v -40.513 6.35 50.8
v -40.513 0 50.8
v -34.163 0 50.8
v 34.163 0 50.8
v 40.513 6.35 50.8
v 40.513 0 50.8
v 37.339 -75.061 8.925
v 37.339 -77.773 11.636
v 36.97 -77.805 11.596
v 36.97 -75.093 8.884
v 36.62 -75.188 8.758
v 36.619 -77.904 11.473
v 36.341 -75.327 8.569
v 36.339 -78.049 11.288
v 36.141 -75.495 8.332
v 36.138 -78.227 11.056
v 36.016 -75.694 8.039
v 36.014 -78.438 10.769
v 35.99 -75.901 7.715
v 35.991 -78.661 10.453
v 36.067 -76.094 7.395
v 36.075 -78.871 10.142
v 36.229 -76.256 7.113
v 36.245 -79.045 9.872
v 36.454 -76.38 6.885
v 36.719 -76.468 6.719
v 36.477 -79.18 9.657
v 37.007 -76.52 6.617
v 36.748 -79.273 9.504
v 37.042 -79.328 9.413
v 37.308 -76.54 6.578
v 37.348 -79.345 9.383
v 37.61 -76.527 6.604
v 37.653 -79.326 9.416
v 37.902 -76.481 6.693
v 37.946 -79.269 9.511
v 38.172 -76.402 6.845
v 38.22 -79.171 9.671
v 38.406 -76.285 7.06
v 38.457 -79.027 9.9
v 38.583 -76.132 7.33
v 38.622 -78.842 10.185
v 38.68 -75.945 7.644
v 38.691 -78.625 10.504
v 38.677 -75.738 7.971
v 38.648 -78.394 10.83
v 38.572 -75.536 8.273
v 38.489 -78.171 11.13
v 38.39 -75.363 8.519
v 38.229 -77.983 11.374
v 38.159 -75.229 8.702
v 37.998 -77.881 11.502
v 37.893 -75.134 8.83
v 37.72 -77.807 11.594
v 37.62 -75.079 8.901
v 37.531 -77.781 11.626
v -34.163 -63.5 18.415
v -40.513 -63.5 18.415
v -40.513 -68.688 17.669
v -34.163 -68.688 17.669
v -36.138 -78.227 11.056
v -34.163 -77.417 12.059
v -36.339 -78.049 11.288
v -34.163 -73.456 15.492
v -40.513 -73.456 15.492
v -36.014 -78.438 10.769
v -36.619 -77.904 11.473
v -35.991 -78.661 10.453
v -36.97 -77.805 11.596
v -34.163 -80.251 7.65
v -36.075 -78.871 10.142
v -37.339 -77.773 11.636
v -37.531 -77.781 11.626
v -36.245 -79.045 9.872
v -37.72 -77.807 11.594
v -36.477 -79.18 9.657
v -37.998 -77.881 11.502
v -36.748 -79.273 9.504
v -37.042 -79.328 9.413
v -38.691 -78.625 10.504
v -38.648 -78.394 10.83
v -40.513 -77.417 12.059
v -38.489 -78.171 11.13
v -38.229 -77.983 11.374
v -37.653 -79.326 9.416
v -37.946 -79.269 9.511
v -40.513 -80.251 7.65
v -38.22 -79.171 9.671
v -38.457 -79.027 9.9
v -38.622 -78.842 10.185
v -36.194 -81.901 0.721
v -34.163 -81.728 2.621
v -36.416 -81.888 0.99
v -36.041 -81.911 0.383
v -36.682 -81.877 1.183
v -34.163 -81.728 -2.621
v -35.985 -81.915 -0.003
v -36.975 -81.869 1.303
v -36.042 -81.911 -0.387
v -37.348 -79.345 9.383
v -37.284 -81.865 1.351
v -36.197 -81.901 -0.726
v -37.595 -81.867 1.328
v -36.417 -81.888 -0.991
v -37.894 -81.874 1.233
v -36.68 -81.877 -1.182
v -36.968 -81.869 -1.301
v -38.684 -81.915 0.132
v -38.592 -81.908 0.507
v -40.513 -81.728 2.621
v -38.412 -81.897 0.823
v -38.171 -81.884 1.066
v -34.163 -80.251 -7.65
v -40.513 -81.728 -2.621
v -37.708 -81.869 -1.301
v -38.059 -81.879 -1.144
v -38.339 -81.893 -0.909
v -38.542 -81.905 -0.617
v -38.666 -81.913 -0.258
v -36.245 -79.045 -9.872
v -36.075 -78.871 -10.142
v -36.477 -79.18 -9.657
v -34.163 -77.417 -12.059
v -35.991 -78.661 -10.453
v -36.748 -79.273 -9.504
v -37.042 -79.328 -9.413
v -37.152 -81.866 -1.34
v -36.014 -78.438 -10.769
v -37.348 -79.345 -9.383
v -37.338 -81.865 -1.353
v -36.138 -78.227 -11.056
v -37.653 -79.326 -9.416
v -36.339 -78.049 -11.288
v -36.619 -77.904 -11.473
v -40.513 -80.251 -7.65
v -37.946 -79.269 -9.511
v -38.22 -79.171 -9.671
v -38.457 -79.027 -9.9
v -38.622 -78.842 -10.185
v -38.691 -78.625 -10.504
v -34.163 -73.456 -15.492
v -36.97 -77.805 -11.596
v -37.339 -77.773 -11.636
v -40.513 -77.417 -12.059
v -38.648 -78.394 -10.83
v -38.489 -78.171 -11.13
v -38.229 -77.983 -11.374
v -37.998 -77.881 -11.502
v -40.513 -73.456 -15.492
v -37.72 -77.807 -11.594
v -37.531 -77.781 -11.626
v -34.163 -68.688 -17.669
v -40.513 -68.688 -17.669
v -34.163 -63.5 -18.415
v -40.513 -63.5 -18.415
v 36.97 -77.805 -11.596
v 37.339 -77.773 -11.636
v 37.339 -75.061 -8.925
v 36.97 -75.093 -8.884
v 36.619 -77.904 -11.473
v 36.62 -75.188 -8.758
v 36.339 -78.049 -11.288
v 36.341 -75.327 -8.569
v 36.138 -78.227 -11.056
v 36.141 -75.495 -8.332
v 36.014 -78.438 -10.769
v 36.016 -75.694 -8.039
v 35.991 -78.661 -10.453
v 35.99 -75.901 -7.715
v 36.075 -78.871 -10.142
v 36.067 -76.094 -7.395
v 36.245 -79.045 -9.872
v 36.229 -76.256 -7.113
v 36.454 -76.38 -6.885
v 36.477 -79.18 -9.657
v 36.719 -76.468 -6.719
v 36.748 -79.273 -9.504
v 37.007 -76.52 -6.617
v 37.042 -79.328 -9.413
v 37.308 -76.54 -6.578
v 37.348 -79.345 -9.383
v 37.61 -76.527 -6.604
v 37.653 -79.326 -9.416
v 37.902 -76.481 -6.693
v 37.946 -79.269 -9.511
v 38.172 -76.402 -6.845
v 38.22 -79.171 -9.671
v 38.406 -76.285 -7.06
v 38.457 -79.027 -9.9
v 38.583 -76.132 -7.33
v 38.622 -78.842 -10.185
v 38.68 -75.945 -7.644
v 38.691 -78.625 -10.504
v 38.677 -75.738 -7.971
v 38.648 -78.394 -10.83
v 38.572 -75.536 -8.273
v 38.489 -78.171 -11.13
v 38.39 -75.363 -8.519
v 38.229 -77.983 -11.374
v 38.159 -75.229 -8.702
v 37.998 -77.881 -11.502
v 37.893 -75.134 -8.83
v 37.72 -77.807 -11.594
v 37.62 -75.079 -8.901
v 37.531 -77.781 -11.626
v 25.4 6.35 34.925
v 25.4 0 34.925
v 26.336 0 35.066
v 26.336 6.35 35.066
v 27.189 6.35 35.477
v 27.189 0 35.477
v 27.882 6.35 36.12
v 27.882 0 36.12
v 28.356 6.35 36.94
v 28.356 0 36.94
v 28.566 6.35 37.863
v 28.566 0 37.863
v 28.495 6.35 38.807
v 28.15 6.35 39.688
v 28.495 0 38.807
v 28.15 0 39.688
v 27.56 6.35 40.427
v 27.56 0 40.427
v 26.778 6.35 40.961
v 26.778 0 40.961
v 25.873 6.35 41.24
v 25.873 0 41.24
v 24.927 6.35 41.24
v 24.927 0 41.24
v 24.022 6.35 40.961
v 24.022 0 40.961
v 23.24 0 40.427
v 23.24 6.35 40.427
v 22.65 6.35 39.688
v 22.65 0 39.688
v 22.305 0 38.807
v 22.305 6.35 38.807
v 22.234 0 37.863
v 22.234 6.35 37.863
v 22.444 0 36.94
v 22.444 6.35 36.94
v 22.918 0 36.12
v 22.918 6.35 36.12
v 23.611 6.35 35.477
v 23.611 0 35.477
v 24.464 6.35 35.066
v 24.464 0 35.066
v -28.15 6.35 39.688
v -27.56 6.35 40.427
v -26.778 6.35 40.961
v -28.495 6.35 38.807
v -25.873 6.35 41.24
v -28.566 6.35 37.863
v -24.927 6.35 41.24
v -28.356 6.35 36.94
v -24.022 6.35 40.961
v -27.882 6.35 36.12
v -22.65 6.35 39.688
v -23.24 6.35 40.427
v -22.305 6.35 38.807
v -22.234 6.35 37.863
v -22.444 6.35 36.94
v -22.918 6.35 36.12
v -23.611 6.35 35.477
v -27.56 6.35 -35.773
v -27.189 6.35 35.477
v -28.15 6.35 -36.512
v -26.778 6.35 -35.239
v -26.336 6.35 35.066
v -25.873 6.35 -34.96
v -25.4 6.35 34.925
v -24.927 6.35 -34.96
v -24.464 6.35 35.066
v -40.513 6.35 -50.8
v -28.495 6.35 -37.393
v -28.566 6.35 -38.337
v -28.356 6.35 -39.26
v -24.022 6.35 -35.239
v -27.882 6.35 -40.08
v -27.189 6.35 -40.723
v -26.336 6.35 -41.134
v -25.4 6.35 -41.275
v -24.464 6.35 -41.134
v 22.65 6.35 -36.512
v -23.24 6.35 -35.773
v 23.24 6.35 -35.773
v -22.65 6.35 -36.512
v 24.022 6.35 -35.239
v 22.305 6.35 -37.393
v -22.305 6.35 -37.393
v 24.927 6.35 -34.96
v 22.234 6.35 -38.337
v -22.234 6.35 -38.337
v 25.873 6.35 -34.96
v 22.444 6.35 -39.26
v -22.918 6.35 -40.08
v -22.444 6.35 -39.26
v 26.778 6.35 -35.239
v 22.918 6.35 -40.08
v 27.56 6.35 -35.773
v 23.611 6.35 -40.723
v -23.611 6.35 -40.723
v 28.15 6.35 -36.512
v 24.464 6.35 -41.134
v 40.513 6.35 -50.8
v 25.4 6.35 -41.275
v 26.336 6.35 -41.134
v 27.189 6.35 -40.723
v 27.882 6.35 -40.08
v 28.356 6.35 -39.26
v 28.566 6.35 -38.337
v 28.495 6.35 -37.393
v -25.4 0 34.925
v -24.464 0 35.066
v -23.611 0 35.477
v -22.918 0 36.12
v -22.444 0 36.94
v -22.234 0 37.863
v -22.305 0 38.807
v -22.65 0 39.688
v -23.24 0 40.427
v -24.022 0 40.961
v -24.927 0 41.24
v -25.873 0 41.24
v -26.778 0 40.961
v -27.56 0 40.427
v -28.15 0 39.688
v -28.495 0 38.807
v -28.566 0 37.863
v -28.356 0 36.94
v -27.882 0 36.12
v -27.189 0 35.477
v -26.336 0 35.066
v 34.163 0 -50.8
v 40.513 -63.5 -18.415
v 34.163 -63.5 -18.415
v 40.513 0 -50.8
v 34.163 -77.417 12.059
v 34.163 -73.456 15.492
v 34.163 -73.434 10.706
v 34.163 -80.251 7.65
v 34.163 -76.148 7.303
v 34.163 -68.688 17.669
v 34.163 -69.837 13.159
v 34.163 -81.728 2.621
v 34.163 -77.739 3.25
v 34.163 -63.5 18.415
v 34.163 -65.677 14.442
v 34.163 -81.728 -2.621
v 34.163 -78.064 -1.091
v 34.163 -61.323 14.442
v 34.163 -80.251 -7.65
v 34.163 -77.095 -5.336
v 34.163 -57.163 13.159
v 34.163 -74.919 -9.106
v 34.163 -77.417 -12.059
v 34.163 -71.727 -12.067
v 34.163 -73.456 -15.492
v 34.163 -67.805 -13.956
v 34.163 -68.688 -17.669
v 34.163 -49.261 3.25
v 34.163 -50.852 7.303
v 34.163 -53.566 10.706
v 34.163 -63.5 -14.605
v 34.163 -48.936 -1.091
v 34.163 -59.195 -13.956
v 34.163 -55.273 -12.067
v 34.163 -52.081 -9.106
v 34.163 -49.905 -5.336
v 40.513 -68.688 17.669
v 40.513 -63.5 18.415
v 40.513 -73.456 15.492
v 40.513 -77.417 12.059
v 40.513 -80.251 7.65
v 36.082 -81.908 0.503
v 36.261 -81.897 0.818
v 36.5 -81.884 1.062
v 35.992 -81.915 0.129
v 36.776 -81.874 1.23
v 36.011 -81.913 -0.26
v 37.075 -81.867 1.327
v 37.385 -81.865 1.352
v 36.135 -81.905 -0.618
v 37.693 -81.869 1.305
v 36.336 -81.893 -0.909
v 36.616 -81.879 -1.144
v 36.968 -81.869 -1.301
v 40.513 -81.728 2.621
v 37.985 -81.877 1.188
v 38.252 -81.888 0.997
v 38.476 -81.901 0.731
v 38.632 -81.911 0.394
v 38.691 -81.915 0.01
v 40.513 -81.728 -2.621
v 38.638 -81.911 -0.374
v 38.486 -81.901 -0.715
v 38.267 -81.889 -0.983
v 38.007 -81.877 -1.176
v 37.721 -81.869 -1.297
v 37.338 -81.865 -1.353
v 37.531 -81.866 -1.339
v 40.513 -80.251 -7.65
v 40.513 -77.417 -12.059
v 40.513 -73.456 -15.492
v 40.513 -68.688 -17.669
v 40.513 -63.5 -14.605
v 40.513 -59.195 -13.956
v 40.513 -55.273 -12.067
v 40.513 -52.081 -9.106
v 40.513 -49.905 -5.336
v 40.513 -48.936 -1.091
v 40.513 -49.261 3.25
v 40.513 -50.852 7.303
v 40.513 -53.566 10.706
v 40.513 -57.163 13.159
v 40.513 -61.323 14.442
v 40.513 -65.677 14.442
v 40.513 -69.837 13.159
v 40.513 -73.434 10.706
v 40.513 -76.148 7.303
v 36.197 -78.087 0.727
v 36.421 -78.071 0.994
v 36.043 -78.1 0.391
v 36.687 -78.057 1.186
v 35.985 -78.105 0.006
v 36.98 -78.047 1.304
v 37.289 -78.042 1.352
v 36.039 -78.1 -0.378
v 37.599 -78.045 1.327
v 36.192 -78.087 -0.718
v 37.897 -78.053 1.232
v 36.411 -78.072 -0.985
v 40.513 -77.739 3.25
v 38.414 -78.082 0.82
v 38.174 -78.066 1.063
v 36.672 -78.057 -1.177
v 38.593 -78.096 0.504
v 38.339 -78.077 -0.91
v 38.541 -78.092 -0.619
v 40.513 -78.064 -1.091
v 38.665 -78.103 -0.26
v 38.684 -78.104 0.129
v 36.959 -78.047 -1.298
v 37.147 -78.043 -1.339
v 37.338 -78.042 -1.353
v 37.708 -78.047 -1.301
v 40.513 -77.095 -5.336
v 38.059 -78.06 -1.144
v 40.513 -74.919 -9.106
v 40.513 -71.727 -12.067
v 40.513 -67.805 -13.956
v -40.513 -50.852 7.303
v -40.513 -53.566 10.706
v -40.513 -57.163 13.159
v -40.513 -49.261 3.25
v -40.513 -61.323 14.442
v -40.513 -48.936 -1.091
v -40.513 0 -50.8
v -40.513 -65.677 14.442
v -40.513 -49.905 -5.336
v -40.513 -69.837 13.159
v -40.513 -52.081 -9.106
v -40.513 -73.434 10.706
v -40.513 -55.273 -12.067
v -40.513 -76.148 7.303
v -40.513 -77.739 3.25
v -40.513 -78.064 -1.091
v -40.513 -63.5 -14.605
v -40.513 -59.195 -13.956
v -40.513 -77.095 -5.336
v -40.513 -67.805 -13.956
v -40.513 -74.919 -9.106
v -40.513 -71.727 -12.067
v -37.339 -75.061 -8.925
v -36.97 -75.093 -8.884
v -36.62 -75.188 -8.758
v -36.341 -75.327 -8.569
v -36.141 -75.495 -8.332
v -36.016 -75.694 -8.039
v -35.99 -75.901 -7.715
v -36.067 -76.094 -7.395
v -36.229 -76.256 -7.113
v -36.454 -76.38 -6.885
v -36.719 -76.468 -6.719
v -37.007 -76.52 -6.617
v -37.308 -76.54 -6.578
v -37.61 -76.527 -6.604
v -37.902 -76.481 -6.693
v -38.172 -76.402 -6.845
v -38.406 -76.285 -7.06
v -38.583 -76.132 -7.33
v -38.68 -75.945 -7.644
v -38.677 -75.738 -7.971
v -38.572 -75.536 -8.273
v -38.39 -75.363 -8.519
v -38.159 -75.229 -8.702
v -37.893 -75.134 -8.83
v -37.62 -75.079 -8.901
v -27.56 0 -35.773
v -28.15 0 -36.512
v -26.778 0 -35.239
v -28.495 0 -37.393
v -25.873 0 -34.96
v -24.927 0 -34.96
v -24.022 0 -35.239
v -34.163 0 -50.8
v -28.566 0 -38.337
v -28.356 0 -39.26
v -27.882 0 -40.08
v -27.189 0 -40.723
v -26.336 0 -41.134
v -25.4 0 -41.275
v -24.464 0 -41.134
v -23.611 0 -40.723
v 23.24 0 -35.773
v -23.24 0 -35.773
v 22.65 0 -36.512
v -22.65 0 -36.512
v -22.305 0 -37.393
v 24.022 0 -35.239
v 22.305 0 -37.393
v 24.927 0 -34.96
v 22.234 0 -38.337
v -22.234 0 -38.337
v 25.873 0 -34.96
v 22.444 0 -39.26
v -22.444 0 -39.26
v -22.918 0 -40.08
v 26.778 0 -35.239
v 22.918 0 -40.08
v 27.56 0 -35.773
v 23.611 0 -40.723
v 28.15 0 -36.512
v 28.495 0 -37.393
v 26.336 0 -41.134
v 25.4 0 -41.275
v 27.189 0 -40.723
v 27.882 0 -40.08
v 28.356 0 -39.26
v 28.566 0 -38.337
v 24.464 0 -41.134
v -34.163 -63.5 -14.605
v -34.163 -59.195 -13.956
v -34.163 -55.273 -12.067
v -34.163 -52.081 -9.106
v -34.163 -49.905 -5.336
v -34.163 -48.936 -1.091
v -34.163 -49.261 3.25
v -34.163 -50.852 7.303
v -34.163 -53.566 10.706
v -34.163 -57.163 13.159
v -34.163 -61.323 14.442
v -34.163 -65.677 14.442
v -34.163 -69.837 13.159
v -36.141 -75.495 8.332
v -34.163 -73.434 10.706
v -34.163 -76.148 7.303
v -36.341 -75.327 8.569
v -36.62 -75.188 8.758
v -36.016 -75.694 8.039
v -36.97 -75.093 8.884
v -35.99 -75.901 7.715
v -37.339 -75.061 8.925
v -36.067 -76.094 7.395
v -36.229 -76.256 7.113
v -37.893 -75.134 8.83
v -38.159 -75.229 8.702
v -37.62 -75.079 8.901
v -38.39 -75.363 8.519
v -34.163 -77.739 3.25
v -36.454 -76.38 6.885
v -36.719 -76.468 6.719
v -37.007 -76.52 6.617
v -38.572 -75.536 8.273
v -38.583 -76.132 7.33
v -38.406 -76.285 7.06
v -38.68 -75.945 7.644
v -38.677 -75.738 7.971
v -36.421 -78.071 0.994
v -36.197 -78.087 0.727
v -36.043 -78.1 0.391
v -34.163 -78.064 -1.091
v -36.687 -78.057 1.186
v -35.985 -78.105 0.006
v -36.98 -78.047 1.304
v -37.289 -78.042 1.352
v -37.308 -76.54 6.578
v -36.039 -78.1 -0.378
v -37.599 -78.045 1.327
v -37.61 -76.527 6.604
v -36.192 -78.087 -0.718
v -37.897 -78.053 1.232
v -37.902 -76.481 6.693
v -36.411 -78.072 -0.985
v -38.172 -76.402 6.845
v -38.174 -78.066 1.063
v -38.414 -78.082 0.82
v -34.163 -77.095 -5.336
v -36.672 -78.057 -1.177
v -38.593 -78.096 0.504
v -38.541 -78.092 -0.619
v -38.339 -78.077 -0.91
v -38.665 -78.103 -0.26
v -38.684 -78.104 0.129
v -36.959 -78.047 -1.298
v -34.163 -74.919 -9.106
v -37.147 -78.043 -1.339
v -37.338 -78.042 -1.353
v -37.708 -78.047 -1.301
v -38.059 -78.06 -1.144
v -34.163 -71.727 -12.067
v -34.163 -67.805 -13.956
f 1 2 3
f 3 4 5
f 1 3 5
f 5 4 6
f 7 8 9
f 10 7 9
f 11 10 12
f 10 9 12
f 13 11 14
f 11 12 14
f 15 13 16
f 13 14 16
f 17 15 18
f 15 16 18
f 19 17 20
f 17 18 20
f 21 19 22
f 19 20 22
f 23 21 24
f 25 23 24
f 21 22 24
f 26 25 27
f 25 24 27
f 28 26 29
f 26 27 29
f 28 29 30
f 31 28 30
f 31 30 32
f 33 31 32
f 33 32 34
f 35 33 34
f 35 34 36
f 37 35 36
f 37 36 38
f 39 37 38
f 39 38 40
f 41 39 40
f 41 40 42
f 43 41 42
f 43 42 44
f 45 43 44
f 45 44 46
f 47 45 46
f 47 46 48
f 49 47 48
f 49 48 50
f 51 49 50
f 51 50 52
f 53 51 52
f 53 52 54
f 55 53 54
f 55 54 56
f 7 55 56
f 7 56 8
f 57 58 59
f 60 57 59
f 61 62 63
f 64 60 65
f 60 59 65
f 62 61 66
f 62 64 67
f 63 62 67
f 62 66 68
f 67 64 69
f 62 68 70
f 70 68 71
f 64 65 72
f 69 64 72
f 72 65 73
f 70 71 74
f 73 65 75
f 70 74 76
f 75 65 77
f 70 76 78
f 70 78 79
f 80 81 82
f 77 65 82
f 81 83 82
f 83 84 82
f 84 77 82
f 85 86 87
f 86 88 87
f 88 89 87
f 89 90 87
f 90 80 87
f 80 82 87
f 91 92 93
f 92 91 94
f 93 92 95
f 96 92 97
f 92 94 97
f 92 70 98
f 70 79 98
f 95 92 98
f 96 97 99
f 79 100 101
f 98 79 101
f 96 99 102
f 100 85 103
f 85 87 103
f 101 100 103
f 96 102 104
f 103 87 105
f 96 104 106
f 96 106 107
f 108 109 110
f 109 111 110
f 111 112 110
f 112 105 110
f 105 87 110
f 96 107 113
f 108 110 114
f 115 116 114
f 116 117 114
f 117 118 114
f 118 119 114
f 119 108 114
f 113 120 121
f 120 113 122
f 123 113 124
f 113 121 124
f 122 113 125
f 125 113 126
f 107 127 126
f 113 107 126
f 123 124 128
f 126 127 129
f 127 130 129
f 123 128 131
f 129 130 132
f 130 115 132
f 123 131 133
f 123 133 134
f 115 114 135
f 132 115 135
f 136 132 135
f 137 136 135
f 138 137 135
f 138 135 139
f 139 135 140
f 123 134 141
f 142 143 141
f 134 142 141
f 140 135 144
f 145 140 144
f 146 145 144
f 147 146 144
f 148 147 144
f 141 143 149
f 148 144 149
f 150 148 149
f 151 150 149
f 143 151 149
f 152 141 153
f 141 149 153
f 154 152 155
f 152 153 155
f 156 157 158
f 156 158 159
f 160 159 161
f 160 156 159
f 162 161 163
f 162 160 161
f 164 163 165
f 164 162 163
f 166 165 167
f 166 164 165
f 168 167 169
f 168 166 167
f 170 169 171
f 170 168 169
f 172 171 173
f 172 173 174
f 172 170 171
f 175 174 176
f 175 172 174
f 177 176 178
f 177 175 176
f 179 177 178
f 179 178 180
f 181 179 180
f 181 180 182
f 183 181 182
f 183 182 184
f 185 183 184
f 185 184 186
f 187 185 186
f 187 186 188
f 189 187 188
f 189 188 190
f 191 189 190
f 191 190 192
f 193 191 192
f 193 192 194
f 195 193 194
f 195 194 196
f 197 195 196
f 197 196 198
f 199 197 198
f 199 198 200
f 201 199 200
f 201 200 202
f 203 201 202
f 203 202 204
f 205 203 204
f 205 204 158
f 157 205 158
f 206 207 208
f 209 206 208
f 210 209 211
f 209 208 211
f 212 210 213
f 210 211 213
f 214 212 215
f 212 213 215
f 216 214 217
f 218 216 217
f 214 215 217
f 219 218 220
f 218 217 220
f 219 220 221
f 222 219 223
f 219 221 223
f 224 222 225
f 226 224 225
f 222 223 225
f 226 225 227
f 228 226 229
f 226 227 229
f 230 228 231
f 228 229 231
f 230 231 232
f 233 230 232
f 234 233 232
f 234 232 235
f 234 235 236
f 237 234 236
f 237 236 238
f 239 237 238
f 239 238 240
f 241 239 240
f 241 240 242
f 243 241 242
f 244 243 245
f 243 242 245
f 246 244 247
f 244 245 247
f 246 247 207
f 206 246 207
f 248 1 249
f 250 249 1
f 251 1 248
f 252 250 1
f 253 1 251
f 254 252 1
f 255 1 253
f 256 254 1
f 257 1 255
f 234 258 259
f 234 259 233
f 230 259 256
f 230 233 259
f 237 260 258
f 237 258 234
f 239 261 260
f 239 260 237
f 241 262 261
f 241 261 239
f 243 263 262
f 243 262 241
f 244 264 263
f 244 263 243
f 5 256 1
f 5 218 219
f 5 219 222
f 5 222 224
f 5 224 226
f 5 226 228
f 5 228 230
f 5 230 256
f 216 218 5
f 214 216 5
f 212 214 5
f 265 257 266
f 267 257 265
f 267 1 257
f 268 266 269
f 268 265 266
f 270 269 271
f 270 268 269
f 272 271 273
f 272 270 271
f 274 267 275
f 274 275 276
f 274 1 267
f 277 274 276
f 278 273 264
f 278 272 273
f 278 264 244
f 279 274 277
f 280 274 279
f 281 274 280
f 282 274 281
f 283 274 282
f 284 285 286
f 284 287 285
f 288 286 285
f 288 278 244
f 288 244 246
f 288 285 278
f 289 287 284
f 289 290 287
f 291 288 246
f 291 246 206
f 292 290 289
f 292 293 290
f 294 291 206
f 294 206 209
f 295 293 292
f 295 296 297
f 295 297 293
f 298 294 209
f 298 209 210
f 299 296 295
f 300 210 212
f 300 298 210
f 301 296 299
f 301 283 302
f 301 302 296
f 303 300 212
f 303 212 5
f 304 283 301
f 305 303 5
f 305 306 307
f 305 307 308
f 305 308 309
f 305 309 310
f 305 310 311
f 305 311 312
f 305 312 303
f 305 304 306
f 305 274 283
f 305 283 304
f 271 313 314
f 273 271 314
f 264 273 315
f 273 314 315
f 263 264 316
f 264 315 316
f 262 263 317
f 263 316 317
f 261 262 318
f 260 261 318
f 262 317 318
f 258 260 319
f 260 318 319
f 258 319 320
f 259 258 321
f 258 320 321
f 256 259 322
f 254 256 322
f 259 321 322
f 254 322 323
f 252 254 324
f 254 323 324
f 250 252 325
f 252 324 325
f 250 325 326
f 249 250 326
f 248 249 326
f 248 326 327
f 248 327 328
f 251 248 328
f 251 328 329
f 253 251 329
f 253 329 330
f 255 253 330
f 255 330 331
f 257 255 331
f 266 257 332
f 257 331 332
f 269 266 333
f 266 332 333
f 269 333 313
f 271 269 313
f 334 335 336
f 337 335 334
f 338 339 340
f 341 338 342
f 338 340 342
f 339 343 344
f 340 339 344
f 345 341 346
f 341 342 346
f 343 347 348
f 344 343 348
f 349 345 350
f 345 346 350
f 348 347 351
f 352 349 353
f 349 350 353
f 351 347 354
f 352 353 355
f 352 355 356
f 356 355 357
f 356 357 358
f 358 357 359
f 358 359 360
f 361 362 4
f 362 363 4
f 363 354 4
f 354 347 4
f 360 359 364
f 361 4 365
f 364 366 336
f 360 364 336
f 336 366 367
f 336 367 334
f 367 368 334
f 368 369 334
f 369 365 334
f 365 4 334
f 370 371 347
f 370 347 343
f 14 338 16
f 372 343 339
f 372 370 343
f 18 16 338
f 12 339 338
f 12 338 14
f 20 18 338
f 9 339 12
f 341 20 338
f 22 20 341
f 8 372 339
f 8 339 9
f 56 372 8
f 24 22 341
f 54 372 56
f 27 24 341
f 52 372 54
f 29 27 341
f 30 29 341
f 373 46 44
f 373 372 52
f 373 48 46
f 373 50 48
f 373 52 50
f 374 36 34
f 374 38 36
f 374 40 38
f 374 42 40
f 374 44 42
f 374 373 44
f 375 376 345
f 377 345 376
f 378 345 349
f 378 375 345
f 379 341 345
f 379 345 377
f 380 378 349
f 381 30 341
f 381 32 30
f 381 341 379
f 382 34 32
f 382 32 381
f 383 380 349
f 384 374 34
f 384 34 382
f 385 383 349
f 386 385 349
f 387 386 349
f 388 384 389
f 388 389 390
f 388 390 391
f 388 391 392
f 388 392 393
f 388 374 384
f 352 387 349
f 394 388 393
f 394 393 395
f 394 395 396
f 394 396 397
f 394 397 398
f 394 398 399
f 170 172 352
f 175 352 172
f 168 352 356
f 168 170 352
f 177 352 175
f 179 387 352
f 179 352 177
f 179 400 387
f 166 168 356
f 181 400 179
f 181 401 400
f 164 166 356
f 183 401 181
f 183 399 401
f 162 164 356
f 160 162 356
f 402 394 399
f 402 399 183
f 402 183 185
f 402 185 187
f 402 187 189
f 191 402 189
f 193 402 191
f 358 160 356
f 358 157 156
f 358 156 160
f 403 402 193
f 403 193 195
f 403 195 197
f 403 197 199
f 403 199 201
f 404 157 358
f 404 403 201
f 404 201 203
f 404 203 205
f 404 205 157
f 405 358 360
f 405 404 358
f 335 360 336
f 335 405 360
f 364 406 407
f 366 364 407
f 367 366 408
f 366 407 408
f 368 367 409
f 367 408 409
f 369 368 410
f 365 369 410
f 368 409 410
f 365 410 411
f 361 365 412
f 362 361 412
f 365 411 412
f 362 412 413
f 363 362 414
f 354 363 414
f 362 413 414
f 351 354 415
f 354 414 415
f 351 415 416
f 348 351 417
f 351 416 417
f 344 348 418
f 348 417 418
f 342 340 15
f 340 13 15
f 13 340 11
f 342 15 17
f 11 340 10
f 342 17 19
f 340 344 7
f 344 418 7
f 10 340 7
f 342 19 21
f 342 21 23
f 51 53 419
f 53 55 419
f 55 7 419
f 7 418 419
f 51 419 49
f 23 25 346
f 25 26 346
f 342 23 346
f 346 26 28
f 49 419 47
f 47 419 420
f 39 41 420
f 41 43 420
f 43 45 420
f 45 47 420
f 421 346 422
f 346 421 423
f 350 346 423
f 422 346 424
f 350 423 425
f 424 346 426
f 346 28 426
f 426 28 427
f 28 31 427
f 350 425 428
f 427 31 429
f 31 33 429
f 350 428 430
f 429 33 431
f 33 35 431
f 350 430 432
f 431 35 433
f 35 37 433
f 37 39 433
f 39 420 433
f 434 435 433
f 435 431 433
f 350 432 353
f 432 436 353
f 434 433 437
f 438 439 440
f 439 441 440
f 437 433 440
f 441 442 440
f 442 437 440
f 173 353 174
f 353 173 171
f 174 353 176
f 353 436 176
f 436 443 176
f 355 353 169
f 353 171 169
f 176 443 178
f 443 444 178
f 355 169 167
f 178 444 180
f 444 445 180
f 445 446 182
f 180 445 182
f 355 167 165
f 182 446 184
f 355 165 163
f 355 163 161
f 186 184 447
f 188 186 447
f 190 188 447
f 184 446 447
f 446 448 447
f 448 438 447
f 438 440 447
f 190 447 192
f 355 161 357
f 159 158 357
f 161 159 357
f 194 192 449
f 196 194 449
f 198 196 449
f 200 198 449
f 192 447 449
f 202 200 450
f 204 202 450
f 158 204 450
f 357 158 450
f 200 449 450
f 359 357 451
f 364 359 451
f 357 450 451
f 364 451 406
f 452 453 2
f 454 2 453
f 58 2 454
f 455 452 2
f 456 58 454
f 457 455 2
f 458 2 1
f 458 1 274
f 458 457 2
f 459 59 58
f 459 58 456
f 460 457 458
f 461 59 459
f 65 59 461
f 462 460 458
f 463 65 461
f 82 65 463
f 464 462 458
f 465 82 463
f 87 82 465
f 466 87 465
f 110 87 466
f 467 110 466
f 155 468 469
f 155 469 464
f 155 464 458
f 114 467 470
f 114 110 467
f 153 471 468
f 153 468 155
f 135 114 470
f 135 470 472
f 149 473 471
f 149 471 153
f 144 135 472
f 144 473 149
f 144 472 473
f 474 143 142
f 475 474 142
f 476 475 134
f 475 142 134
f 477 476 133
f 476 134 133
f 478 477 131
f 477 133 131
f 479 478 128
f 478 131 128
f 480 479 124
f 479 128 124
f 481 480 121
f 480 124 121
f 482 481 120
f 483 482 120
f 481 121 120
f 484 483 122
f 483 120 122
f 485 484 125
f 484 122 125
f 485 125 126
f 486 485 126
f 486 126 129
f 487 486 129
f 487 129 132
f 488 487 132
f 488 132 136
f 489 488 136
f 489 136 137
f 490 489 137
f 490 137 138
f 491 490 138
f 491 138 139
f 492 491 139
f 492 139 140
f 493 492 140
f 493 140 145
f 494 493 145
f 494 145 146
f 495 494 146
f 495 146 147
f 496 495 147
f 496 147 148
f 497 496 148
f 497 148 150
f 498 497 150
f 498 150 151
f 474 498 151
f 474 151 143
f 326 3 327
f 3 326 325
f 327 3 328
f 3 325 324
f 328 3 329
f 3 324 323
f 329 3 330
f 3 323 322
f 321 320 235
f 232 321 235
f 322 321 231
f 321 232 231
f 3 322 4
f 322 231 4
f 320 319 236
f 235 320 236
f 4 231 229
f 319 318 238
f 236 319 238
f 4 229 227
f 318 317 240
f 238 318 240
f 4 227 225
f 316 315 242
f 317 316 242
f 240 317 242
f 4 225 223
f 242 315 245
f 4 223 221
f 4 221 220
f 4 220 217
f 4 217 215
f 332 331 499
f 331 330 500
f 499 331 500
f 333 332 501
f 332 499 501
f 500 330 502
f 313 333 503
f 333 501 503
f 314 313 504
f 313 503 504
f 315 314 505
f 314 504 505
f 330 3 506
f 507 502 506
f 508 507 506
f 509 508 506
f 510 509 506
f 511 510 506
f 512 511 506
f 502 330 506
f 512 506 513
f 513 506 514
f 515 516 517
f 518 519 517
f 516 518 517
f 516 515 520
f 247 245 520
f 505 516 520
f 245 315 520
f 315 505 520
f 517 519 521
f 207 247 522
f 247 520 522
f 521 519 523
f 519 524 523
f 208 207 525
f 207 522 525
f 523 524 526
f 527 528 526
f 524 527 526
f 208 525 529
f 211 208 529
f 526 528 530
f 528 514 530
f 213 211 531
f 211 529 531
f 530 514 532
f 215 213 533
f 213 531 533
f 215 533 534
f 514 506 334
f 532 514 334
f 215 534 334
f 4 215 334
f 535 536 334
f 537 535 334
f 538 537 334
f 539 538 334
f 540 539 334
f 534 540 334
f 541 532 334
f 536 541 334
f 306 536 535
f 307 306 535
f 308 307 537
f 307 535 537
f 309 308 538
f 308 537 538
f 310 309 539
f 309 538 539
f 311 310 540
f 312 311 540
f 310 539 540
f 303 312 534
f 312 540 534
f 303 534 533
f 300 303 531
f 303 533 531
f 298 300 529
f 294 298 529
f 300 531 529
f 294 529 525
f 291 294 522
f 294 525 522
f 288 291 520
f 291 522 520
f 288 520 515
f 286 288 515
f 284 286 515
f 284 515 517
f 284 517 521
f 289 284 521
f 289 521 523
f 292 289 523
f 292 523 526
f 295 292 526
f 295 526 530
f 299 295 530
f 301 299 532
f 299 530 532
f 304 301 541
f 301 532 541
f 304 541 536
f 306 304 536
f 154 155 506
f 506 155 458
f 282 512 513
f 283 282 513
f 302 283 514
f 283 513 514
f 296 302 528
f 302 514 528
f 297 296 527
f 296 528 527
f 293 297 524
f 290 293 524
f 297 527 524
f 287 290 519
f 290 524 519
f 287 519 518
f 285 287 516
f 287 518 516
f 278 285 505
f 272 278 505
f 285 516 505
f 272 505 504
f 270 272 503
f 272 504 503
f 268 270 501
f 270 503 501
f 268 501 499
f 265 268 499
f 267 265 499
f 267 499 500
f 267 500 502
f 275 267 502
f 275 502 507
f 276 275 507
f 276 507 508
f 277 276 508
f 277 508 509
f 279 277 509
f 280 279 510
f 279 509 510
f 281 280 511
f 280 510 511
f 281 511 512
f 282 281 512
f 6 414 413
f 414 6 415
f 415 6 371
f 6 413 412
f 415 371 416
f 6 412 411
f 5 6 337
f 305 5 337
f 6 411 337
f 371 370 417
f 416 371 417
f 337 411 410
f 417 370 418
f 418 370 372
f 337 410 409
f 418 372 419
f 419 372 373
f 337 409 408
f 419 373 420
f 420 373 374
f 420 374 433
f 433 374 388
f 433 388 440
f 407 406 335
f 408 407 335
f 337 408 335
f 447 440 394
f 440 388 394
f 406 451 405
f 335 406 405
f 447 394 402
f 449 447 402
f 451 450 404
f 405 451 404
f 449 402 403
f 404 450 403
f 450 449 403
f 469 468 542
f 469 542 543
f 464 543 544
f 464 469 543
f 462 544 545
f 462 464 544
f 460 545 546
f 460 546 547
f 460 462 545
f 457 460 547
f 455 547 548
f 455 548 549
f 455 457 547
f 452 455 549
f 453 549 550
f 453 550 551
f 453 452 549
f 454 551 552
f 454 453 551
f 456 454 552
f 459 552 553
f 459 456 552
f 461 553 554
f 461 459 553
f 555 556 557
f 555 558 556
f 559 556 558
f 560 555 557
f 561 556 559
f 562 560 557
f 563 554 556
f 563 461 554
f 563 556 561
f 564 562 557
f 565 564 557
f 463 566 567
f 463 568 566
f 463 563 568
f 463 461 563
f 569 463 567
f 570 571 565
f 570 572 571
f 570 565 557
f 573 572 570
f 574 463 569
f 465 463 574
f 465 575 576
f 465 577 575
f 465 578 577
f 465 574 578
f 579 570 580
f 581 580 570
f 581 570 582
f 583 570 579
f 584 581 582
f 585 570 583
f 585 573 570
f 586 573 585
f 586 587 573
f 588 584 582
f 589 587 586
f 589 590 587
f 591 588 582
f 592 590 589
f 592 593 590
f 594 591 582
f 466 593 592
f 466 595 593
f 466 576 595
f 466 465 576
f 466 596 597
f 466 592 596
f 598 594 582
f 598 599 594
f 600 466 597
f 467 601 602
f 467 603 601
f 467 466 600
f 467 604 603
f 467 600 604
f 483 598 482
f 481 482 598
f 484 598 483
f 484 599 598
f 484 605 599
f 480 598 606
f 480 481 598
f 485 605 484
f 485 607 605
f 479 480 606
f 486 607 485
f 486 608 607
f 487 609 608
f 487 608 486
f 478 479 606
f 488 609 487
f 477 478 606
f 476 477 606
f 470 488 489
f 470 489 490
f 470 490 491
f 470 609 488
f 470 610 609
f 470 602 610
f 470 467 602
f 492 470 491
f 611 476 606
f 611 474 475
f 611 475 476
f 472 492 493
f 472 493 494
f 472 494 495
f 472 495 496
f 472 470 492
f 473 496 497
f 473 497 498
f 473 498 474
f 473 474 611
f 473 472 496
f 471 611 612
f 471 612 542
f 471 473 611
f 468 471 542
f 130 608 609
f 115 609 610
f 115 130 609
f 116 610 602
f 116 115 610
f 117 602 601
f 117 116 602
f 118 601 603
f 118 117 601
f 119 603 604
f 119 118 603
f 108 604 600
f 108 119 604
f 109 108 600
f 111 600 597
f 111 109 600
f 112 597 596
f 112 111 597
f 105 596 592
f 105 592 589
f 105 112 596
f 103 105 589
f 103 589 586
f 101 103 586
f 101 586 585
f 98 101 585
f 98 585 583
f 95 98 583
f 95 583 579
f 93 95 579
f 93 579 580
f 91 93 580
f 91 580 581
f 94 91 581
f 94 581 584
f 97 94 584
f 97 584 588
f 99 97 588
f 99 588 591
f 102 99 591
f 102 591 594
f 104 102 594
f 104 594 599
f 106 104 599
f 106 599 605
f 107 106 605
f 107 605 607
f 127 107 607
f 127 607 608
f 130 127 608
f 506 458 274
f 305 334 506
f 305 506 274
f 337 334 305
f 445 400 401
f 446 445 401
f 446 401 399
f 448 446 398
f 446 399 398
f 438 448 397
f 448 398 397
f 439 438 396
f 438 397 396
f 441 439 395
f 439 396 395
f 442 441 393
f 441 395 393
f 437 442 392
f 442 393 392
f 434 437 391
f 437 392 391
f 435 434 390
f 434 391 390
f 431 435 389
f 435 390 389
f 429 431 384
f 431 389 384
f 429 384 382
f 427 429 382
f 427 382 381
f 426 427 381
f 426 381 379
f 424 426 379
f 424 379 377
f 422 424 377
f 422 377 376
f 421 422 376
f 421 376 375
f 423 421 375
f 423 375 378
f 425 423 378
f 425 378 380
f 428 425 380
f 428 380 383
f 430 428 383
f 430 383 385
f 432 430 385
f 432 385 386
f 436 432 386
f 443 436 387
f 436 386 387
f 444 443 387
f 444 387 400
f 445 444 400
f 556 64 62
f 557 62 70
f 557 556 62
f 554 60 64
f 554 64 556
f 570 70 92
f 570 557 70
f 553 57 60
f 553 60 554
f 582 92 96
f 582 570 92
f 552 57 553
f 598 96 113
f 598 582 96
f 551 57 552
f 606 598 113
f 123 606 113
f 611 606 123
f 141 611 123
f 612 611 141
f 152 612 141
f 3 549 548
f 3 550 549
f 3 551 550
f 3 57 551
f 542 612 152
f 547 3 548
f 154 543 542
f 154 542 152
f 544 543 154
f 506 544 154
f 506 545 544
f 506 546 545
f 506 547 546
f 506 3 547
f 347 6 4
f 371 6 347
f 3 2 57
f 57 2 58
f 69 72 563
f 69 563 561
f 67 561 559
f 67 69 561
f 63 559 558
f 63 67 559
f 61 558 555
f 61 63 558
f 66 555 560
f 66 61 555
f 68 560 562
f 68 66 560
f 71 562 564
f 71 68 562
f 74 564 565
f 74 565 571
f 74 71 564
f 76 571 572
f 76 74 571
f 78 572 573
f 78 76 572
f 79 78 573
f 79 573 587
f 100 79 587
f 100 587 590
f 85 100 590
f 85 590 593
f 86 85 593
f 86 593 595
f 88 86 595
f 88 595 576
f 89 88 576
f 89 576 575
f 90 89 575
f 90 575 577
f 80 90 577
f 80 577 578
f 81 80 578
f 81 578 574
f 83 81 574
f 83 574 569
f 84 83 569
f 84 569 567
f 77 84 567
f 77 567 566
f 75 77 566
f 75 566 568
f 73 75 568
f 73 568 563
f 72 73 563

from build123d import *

# Parameters (mm, degrees)
SKETCH2_W               = 81.026
SKETCH2_H               = 101.6
BOSS_EXTRUDE1_DEPTH     = 6.35
SKETCH3_R               = 14.605
BOSS_EXTRUDE2_DEPTH     = 6.35
SKETCH5_R               = 1.35255
CUT_EXTRUDE1_DEPTH      = 16.256
SKETCH6_R               = 1.35255
CUT_EXTRUDE2_DEPTH      = 9.652
MIRROR2_COPY_1_SKETCH_R = 1.35255
MIRROR2_COPY_1_DEPTH    = 9.652
SKETCH7_R               = 3.175
CUT_EXTRUDE3_DEPTH      = 6.35


with BuildPart() as part:
    # Sketch2 → Boss-Extrude1 (new body)
    with BuildSketch(Plane(origin=(0, 0, 0), x_dir=(1, 0, 0), z_dir=(0, 1, 0))):
        Rectangle(SKETCH2_W, SKETCH2_H)
    extrude(amount=BOSS_EXTRUDE1_DEPTH)

    # Sketch3 → Boss-Extrude2 (add)
    with BuildSketch(Plane(origin=(40.513, 0, 0), x_dir=(0, 0, -1), z_dir=(1, 0, 0))):
        with BuildLine():
            Line((-50.8, 6.35), (-50.8, 0))
            Line((-50.8, 0), (-18.415, -63.5))
            ThreePointArc((-18.415, -63.5), (0, -81.915), (18.415, -63.5))
            Line((18.415, -63.5), (50.8, 0))
            Line((50.8, 0), (50.8, 6.35))
            Line((50.8, 6.35), (-50.8, 6.35))
        make_face()
        with Locations((0, -63.5)):
            Circle(SKETCH3_R, mode=Mode.SUBTRACT)
    boss_extrude2 = extrude(amount=-BOSS_EXTRUDE2_DEPTH)

    # Sketch5 → Cut-Extrude1 (cut)
    with BuildSketch(Plane(origin=(0, -81.915, 0), x_dir=(-1, 0, 0), z_dir=(0, -1, 0))):
        with Locations(Location((-37.338, 0, 0), (0, 0, 90))):
            Circle(SKETCH5_R)
    cut_extrude1 = extrude(amount=-CUT_EXTRUDE1_DEPTH, mode=Mode.SUBTRACT)

    # Sketch6 → Cut-Extrude2 (cut)
    with BuildSketch(Plane(origin=(0, -45.669396988, -45.669396988), x_dir=(1, 0, 0), z_dir=(0, 0.7071067811865464, 0.7071067811865488))):
        with Locations(Location((37.339349705, -48.118027143, 0), (0, 0, 90))):
            Circle(SKETCH6_R)
    cut_extrude2 = extrude(amount=CUT_EXTRUDE2_DEPTH, mode=Mode.SUBTRACT)

    # Mirror1: Cut-Extrude2 across plane
    add(cut_extrude2.mirror(Plane.XY), mode=Mode.SUBTRACT)

    # Mirror2: Boss-Extrude2, Cut-Extrude1, Cut-Extrude2 across plane
    add(boss_extrude2.mirror(Plane(origin=(0, 0, 0), x_dir=(0, 0, 1), z_dir=(1, 0, 0))))
    add(cut_extrude1.mirror(Plane(origin=(0, 0, 0), x_dir=(0, 0, 1), z_dir=(1, 0, 0))), mode=Mode.SUBTRACT)
    add(cut_extrude2.mirror(Plane(origin=(0, 0, 0), x_dir=(0, 0, 1), z_dir=(1, 0, 0))), mode=Mode.SUBTRACT)

    # Mirror2 copy 1 sketch → Mirror2 copy 1 (cut)
    with BuildSketch(Plane(origin=(0, -45.669396988, 45.669396988), x_dir=(-1, 0, 0), z_dir=(0, 0.7071067811865464, -0.7071067811865488))):
        with Locations(Location((37.339349705, -48.118027143, 0), (0, 0, 90))):
            Circle(MIRROR2_COPY_1_SKETCH_R)
    extrude(amount=MIRROR2_COPY_1_DEPTH, mode=Mode.SUBTRACT)

    # Sketch7 → Cut-Extrude3 (cut)
    with BuildSketch(Plane.XZ):
        with Locations(Location((-25.4, 38.1, 0), (0, 0, 270))):
            Circle(SKETCH7_R)
        with Locations(Location((25.4, 38.1, 0), (0, 0, 270))):
            Circle(SKETCH7_R)
        with Locations(Location((25.4, -38.1, 0), (0, 0, 270))):
            Circle(SKETCH7_R)
        with Locations(Location((-25.4, -38.1, 0), (0, 0, 270))):
            Circle(SKETCH7_R)
    extrude(amount=-CUT_EXTRUDE3_DEPTH, mode=Mode.SUBTRACT)


solid = part.part
